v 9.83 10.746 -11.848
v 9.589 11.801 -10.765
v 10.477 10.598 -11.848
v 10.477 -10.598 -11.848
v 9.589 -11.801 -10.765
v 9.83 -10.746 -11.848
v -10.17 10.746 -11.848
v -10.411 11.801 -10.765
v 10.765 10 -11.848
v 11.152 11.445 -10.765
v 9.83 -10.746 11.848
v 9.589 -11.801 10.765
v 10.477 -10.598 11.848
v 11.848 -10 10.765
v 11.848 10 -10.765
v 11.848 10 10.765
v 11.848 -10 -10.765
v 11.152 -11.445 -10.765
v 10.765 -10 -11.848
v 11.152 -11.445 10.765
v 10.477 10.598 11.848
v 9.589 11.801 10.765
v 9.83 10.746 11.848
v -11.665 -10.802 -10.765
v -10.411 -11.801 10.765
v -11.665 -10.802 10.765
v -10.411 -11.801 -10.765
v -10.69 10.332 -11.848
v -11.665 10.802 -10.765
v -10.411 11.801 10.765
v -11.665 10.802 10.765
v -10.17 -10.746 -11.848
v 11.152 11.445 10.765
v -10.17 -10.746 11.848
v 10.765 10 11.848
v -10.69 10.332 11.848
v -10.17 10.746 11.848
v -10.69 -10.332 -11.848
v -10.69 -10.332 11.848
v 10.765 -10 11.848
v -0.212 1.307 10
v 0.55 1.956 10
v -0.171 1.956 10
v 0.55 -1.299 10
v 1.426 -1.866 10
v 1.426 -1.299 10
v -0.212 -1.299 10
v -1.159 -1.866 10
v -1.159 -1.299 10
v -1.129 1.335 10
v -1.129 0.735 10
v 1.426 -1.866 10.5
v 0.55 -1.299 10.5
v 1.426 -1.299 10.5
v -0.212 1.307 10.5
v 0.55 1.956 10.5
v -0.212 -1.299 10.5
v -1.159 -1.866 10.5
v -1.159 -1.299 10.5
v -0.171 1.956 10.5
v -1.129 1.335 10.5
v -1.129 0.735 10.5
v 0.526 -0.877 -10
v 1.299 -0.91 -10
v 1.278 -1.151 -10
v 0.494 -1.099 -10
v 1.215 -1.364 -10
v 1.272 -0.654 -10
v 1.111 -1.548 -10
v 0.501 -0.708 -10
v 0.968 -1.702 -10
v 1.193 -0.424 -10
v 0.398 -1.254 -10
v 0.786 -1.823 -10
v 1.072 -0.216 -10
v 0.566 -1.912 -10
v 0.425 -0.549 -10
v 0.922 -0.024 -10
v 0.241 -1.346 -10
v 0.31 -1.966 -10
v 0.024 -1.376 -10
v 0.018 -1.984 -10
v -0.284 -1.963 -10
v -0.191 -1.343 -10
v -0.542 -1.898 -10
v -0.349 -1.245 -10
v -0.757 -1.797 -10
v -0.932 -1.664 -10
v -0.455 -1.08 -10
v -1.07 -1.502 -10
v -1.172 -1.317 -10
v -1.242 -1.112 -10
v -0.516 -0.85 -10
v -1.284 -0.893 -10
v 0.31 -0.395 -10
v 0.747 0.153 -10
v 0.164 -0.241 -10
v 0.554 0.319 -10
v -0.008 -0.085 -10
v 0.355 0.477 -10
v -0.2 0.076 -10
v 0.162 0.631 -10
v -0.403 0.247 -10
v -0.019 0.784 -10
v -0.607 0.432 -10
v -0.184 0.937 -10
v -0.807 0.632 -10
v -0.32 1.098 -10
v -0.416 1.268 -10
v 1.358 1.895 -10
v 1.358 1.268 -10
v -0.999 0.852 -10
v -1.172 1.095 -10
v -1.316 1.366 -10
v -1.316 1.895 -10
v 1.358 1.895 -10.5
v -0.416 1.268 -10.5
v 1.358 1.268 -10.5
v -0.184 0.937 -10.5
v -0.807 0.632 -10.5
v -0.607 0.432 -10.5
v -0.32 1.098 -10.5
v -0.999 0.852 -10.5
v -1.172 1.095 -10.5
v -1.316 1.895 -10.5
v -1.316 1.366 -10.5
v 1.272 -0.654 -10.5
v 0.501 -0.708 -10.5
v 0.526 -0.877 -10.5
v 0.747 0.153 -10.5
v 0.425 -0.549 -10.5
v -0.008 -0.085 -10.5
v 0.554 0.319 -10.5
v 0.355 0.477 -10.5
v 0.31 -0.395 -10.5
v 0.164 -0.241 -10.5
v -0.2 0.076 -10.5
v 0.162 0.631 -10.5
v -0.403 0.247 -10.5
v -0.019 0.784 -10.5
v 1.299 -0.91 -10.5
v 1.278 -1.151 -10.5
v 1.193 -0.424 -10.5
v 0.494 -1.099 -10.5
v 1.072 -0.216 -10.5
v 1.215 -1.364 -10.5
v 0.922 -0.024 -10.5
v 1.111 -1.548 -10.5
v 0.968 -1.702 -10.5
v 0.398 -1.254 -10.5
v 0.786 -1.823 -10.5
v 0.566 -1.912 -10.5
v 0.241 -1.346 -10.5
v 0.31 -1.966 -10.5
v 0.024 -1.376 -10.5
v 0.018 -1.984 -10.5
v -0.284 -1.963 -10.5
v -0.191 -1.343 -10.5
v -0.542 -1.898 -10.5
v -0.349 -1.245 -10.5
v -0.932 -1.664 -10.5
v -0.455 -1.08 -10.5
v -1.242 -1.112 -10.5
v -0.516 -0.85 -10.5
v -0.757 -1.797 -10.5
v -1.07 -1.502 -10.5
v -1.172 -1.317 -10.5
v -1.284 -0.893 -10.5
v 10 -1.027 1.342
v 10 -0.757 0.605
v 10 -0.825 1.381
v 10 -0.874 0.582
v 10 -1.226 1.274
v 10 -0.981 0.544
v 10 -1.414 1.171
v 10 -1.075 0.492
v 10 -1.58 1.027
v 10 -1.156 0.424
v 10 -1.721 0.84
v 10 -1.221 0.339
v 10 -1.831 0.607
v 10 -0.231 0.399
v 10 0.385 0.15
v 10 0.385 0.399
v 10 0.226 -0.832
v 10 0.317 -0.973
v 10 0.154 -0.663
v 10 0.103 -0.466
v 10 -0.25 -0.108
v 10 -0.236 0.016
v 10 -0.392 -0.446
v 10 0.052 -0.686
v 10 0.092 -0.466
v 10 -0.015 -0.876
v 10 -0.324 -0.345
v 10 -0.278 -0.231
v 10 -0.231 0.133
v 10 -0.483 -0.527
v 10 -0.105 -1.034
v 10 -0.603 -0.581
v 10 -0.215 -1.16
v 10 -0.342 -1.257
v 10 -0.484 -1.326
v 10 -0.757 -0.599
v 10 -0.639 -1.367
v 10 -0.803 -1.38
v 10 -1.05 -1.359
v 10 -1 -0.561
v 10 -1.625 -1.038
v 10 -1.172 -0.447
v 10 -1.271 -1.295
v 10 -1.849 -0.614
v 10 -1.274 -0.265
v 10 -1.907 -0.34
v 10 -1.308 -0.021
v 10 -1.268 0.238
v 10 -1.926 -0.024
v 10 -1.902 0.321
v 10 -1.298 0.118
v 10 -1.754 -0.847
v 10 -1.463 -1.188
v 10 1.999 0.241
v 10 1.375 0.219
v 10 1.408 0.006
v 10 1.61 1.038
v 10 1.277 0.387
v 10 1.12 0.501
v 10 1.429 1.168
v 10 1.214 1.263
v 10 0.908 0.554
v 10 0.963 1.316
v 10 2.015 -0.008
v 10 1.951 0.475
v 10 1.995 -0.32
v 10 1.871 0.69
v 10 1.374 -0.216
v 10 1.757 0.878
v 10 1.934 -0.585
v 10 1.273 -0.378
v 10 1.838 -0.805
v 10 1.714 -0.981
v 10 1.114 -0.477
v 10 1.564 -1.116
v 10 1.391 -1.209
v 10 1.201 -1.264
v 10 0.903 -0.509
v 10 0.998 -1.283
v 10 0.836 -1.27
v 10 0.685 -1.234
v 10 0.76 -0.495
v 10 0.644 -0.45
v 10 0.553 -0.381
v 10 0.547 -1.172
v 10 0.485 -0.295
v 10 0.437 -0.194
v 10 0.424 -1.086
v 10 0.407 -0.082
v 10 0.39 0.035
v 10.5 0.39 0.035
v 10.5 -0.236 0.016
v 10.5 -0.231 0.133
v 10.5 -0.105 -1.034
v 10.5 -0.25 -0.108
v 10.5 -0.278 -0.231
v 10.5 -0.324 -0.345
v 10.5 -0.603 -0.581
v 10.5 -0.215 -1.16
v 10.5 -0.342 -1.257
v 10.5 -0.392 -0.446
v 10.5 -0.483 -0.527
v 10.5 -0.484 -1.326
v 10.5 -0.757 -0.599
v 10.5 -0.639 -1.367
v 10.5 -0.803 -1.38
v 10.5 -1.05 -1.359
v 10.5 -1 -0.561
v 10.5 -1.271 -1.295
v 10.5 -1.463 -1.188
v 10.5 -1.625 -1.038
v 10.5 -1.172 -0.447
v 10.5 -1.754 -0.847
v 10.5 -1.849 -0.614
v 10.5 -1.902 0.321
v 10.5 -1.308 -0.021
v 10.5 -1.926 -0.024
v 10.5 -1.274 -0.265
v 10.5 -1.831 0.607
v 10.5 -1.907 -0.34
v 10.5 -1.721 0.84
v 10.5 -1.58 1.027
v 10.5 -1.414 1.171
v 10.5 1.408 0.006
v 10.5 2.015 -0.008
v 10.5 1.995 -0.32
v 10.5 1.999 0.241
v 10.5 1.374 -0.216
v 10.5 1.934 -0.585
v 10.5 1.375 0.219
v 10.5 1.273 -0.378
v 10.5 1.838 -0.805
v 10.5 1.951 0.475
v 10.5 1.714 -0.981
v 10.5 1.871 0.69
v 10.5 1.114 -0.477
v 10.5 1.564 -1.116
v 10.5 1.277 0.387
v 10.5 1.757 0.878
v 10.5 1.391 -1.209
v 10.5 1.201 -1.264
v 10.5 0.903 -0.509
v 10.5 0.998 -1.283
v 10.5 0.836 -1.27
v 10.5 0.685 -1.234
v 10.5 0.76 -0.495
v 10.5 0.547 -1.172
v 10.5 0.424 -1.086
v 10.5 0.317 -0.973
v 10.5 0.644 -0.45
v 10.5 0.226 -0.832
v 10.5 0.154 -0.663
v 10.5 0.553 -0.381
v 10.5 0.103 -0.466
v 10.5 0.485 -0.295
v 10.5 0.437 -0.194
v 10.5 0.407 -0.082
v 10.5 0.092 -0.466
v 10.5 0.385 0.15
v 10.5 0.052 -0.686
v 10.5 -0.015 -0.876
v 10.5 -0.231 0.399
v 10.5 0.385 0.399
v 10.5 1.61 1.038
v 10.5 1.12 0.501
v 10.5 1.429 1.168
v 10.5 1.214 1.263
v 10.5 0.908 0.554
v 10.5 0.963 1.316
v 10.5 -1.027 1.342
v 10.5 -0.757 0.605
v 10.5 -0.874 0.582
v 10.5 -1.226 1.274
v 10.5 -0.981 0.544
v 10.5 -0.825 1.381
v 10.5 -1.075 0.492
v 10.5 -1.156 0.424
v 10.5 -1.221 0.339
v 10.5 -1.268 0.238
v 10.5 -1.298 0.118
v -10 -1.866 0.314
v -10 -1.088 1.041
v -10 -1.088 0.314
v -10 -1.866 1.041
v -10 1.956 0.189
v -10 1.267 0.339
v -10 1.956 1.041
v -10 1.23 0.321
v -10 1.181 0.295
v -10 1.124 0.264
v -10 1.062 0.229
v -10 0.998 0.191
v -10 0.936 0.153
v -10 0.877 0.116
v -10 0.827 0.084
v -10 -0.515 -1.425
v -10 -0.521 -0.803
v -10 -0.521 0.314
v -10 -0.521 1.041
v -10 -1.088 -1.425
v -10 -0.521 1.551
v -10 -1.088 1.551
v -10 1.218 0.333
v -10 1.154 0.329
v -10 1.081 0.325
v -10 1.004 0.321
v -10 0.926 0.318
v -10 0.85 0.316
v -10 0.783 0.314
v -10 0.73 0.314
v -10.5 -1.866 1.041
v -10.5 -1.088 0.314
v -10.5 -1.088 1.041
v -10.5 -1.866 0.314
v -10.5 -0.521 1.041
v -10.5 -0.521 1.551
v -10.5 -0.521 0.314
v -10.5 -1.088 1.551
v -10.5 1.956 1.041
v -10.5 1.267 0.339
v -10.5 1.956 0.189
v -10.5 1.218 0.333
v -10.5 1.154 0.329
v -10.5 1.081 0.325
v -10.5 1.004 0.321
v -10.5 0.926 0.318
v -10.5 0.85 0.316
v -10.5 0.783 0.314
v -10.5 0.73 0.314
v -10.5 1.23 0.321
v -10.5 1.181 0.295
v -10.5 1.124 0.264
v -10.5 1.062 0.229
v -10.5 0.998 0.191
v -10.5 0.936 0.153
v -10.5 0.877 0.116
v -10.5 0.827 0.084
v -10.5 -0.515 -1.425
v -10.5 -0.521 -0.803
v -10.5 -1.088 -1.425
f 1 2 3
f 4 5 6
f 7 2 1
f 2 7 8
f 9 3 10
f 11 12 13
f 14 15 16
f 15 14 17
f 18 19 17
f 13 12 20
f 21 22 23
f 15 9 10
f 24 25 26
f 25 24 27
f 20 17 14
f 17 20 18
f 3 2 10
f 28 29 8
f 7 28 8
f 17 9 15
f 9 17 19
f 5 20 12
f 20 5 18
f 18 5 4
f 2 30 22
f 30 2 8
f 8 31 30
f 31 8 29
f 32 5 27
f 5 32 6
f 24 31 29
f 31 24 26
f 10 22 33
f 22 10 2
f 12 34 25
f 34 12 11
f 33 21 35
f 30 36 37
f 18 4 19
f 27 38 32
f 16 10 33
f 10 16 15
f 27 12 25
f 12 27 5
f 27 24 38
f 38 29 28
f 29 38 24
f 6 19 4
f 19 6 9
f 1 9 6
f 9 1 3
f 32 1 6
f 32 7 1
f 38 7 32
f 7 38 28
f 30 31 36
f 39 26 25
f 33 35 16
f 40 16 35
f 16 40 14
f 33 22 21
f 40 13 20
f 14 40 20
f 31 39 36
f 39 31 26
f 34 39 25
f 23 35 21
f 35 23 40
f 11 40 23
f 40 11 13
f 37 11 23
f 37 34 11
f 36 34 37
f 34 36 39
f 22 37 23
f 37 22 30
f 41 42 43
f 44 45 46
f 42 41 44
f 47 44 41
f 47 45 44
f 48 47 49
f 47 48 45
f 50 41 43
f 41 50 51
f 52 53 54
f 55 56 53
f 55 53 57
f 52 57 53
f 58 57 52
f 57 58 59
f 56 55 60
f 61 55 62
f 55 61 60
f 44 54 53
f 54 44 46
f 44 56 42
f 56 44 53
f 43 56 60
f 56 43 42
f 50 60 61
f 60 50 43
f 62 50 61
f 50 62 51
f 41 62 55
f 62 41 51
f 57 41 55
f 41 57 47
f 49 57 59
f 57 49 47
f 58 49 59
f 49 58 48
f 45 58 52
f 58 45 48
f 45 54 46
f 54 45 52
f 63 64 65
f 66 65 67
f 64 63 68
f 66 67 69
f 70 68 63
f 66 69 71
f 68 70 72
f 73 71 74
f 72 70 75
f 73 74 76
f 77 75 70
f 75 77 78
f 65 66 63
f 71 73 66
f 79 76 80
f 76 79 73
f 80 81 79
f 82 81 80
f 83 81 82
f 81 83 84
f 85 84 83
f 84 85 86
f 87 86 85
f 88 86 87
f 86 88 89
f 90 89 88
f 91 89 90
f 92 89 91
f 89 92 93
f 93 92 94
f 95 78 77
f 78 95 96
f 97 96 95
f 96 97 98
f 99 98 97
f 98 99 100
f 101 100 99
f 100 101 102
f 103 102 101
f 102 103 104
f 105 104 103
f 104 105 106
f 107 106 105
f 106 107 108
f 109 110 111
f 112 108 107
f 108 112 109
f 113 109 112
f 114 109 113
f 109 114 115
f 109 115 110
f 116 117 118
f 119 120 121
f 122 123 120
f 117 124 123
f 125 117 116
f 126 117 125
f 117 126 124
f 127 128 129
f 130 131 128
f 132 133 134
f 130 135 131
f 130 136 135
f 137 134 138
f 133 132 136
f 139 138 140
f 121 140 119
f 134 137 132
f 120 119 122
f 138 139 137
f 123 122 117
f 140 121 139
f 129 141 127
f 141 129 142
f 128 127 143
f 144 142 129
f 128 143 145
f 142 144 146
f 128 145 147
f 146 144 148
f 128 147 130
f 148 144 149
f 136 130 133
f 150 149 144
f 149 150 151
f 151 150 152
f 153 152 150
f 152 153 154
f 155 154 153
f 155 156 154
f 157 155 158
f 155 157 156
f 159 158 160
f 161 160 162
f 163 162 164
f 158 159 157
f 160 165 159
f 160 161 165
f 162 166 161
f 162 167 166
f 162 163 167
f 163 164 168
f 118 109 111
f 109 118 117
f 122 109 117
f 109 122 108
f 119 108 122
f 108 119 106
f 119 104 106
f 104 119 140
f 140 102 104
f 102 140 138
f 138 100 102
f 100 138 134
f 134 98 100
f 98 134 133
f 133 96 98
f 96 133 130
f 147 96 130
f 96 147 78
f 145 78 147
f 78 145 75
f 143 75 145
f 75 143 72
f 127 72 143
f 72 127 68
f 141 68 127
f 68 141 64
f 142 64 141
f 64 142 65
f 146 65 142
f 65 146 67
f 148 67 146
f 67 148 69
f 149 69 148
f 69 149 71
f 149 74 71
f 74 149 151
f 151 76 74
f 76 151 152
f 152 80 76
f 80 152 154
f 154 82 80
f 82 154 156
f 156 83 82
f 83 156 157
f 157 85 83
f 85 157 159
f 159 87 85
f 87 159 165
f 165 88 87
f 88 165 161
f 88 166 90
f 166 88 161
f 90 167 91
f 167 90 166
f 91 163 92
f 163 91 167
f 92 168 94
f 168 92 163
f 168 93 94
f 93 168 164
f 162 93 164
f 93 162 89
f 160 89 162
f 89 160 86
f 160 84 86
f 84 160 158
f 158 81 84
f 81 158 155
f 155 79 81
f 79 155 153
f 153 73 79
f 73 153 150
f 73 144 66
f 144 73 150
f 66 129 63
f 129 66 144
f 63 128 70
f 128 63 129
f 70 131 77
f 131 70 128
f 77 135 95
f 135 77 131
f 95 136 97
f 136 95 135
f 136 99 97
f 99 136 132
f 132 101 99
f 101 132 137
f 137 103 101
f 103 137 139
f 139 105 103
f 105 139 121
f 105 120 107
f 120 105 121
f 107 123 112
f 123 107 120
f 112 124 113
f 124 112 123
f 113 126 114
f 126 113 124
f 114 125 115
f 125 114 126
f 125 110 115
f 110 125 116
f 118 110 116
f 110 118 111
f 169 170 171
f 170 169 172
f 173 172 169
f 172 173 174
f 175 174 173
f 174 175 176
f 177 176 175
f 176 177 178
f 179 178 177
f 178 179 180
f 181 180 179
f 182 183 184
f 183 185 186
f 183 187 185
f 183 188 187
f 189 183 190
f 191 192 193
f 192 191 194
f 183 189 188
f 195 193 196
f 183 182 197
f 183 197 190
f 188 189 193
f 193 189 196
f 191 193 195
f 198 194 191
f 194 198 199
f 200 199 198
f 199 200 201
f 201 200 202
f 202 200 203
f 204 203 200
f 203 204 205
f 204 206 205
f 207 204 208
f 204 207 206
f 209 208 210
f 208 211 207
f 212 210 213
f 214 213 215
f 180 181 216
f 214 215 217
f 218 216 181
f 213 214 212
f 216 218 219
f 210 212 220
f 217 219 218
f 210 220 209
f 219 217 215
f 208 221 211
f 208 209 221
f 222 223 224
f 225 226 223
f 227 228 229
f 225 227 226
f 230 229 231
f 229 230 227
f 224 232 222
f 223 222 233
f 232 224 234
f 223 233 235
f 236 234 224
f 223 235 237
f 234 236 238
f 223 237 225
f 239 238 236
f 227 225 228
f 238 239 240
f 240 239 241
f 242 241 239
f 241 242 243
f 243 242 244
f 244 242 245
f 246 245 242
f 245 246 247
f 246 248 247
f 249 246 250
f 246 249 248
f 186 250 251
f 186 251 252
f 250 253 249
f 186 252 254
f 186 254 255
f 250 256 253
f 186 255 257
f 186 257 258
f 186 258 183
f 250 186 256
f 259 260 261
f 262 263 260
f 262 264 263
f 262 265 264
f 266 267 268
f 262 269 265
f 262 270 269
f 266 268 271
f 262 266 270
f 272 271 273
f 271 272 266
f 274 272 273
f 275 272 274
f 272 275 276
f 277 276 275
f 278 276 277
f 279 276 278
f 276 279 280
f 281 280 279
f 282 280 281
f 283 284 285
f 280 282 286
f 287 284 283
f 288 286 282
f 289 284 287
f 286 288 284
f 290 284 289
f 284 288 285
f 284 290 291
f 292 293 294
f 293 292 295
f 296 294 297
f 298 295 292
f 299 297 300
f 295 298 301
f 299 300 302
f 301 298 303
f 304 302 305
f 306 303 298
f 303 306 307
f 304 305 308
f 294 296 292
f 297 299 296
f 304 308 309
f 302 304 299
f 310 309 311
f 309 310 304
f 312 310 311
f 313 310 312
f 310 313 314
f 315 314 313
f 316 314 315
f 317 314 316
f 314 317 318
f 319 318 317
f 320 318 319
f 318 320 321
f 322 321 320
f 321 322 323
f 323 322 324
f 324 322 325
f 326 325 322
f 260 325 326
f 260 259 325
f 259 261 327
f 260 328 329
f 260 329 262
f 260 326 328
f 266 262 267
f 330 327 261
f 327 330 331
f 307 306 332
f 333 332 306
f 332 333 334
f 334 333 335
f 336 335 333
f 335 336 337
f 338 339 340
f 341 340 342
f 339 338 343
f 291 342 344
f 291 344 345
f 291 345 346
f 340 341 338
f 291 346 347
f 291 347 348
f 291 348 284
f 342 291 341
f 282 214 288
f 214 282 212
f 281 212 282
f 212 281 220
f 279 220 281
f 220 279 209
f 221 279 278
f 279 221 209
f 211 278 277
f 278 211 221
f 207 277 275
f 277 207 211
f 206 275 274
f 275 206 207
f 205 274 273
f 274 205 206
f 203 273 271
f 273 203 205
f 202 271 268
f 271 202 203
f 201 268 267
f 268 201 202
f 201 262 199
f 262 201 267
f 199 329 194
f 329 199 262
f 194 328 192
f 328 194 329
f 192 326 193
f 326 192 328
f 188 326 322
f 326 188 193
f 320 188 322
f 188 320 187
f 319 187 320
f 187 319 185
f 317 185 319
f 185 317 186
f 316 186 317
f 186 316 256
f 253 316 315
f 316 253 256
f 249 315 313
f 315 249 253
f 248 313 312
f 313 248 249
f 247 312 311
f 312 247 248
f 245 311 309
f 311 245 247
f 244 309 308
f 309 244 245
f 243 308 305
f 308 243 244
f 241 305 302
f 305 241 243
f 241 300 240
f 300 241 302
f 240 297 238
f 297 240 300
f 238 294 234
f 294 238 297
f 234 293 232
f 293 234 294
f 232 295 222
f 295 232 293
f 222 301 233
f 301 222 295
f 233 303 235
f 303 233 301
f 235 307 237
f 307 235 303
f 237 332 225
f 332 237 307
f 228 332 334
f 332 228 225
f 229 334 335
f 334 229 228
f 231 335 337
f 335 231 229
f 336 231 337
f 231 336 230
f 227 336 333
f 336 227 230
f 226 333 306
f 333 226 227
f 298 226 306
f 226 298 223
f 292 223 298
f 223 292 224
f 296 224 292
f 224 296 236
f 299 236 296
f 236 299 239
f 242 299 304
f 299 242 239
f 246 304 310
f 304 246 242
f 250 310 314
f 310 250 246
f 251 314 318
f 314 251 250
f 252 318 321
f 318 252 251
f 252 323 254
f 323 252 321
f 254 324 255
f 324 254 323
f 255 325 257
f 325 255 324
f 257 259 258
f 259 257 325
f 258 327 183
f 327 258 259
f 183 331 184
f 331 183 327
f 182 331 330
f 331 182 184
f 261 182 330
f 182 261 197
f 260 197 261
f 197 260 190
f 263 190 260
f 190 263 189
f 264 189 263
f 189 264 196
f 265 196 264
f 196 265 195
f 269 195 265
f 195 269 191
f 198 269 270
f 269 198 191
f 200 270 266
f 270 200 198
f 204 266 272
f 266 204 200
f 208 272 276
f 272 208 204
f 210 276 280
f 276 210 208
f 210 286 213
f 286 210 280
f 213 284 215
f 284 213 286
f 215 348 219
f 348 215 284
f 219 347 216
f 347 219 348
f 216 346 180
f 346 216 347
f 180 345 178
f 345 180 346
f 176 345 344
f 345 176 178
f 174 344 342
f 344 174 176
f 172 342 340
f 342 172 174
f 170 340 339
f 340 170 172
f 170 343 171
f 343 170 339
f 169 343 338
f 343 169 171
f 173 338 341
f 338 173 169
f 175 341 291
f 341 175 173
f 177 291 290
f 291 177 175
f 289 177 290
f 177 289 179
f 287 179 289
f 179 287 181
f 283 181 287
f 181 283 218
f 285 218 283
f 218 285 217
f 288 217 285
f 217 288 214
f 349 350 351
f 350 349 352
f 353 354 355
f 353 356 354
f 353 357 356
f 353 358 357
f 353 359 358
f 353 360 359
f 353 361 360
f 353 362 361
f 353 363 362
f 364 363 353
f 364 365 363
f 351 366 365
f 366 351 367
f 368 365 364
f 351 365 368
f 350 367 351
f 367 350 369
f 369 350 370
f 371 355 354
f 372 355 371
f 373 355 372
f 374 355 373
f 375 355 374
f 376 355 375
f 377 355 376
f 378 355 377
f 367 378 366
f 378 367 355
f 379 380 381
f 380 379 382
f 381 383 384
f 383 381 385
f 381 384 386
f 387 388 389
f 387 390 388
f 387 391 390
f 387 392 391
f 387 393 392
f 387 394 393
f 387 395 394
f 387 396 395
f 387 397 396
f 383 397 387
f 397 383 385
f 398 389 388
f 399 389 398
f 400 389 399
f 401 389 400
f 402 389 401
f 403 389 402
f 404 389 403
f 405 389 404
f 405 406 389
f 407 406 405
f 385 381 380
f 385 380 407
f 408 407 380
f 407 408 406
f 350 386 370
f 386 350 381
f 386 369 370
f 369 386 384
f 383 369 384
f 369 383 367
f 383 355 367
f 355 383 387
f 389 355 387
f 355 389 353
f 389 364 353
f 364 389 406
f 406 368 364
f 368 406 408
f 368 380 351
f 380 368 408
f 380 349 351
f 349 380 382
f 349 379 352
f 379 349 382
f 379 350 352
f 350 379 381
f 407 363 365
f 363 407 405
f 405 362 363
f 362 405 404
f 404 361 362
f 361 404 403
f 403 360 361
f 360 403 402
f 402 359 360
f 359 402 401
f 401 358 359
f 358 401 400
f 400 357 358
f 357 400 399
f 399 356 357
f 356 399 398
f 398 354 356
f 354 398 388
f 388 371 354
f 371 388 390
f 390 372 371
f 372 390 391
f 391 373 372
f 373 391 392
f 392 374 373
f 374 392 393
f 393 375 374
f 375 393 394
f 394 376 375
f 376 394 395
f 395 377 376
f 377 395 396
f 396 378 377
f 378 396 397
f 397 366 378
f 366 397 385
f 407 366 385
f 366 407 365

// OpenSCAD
extrusion_height = 0.5;

module die(labels = ["1", "2", "3", "4", "5", "6"]) {
  difference() {
    minkowski() {
      cube([20, 20, 20], center=true);
      sphere(2);
    }
    translate([0, 0, 10])
      rotate([0, 0, 0])
        linear_extrude(height=extrusion_height)
          text(labels[0], size=4, halign="center", valign="center", font="Arial:style=Bold");
    translate([0, 0, -10])
      rotate([180, 0, 0])
        linear_extrude(height=extrusion_height)
          text(labels[1], size=4, halign="center", valign="center", font="Arial:style=Bold");
    translate([10, 0, 0])
      rotate([0, 90, 0])
        linear_extrude(height=extrusion_height)
          text(labels[2], size=4, halign="center", valign="center", font="Arial:style=Bold");
    translate([-10, 0, 0])
      rotate([0, -90, 0])
        linear_extrude(height=extrusion_height)
          text(labels[3], size=4, halign="center", valign="center", font="Arial:style=Bold");
    translate([0, 13, 0])
      rotate([90, 0, 0])
        mirror([1, 0, 0])
          linear_extrude(height=extrusion_height)
            text(labels[4], size=4, halign="center", valign="center", font="Arial:style=Bold");
    translate([0, -13, 0])
      rotate([-90, 0, 0])
        mirror([1, 0, 0])
          linear_extrude(height=extrusion_height)
            text(labels[5], size=4, halign="center", valign="center", font="Arial:style=Bold");
  }
}

die();
